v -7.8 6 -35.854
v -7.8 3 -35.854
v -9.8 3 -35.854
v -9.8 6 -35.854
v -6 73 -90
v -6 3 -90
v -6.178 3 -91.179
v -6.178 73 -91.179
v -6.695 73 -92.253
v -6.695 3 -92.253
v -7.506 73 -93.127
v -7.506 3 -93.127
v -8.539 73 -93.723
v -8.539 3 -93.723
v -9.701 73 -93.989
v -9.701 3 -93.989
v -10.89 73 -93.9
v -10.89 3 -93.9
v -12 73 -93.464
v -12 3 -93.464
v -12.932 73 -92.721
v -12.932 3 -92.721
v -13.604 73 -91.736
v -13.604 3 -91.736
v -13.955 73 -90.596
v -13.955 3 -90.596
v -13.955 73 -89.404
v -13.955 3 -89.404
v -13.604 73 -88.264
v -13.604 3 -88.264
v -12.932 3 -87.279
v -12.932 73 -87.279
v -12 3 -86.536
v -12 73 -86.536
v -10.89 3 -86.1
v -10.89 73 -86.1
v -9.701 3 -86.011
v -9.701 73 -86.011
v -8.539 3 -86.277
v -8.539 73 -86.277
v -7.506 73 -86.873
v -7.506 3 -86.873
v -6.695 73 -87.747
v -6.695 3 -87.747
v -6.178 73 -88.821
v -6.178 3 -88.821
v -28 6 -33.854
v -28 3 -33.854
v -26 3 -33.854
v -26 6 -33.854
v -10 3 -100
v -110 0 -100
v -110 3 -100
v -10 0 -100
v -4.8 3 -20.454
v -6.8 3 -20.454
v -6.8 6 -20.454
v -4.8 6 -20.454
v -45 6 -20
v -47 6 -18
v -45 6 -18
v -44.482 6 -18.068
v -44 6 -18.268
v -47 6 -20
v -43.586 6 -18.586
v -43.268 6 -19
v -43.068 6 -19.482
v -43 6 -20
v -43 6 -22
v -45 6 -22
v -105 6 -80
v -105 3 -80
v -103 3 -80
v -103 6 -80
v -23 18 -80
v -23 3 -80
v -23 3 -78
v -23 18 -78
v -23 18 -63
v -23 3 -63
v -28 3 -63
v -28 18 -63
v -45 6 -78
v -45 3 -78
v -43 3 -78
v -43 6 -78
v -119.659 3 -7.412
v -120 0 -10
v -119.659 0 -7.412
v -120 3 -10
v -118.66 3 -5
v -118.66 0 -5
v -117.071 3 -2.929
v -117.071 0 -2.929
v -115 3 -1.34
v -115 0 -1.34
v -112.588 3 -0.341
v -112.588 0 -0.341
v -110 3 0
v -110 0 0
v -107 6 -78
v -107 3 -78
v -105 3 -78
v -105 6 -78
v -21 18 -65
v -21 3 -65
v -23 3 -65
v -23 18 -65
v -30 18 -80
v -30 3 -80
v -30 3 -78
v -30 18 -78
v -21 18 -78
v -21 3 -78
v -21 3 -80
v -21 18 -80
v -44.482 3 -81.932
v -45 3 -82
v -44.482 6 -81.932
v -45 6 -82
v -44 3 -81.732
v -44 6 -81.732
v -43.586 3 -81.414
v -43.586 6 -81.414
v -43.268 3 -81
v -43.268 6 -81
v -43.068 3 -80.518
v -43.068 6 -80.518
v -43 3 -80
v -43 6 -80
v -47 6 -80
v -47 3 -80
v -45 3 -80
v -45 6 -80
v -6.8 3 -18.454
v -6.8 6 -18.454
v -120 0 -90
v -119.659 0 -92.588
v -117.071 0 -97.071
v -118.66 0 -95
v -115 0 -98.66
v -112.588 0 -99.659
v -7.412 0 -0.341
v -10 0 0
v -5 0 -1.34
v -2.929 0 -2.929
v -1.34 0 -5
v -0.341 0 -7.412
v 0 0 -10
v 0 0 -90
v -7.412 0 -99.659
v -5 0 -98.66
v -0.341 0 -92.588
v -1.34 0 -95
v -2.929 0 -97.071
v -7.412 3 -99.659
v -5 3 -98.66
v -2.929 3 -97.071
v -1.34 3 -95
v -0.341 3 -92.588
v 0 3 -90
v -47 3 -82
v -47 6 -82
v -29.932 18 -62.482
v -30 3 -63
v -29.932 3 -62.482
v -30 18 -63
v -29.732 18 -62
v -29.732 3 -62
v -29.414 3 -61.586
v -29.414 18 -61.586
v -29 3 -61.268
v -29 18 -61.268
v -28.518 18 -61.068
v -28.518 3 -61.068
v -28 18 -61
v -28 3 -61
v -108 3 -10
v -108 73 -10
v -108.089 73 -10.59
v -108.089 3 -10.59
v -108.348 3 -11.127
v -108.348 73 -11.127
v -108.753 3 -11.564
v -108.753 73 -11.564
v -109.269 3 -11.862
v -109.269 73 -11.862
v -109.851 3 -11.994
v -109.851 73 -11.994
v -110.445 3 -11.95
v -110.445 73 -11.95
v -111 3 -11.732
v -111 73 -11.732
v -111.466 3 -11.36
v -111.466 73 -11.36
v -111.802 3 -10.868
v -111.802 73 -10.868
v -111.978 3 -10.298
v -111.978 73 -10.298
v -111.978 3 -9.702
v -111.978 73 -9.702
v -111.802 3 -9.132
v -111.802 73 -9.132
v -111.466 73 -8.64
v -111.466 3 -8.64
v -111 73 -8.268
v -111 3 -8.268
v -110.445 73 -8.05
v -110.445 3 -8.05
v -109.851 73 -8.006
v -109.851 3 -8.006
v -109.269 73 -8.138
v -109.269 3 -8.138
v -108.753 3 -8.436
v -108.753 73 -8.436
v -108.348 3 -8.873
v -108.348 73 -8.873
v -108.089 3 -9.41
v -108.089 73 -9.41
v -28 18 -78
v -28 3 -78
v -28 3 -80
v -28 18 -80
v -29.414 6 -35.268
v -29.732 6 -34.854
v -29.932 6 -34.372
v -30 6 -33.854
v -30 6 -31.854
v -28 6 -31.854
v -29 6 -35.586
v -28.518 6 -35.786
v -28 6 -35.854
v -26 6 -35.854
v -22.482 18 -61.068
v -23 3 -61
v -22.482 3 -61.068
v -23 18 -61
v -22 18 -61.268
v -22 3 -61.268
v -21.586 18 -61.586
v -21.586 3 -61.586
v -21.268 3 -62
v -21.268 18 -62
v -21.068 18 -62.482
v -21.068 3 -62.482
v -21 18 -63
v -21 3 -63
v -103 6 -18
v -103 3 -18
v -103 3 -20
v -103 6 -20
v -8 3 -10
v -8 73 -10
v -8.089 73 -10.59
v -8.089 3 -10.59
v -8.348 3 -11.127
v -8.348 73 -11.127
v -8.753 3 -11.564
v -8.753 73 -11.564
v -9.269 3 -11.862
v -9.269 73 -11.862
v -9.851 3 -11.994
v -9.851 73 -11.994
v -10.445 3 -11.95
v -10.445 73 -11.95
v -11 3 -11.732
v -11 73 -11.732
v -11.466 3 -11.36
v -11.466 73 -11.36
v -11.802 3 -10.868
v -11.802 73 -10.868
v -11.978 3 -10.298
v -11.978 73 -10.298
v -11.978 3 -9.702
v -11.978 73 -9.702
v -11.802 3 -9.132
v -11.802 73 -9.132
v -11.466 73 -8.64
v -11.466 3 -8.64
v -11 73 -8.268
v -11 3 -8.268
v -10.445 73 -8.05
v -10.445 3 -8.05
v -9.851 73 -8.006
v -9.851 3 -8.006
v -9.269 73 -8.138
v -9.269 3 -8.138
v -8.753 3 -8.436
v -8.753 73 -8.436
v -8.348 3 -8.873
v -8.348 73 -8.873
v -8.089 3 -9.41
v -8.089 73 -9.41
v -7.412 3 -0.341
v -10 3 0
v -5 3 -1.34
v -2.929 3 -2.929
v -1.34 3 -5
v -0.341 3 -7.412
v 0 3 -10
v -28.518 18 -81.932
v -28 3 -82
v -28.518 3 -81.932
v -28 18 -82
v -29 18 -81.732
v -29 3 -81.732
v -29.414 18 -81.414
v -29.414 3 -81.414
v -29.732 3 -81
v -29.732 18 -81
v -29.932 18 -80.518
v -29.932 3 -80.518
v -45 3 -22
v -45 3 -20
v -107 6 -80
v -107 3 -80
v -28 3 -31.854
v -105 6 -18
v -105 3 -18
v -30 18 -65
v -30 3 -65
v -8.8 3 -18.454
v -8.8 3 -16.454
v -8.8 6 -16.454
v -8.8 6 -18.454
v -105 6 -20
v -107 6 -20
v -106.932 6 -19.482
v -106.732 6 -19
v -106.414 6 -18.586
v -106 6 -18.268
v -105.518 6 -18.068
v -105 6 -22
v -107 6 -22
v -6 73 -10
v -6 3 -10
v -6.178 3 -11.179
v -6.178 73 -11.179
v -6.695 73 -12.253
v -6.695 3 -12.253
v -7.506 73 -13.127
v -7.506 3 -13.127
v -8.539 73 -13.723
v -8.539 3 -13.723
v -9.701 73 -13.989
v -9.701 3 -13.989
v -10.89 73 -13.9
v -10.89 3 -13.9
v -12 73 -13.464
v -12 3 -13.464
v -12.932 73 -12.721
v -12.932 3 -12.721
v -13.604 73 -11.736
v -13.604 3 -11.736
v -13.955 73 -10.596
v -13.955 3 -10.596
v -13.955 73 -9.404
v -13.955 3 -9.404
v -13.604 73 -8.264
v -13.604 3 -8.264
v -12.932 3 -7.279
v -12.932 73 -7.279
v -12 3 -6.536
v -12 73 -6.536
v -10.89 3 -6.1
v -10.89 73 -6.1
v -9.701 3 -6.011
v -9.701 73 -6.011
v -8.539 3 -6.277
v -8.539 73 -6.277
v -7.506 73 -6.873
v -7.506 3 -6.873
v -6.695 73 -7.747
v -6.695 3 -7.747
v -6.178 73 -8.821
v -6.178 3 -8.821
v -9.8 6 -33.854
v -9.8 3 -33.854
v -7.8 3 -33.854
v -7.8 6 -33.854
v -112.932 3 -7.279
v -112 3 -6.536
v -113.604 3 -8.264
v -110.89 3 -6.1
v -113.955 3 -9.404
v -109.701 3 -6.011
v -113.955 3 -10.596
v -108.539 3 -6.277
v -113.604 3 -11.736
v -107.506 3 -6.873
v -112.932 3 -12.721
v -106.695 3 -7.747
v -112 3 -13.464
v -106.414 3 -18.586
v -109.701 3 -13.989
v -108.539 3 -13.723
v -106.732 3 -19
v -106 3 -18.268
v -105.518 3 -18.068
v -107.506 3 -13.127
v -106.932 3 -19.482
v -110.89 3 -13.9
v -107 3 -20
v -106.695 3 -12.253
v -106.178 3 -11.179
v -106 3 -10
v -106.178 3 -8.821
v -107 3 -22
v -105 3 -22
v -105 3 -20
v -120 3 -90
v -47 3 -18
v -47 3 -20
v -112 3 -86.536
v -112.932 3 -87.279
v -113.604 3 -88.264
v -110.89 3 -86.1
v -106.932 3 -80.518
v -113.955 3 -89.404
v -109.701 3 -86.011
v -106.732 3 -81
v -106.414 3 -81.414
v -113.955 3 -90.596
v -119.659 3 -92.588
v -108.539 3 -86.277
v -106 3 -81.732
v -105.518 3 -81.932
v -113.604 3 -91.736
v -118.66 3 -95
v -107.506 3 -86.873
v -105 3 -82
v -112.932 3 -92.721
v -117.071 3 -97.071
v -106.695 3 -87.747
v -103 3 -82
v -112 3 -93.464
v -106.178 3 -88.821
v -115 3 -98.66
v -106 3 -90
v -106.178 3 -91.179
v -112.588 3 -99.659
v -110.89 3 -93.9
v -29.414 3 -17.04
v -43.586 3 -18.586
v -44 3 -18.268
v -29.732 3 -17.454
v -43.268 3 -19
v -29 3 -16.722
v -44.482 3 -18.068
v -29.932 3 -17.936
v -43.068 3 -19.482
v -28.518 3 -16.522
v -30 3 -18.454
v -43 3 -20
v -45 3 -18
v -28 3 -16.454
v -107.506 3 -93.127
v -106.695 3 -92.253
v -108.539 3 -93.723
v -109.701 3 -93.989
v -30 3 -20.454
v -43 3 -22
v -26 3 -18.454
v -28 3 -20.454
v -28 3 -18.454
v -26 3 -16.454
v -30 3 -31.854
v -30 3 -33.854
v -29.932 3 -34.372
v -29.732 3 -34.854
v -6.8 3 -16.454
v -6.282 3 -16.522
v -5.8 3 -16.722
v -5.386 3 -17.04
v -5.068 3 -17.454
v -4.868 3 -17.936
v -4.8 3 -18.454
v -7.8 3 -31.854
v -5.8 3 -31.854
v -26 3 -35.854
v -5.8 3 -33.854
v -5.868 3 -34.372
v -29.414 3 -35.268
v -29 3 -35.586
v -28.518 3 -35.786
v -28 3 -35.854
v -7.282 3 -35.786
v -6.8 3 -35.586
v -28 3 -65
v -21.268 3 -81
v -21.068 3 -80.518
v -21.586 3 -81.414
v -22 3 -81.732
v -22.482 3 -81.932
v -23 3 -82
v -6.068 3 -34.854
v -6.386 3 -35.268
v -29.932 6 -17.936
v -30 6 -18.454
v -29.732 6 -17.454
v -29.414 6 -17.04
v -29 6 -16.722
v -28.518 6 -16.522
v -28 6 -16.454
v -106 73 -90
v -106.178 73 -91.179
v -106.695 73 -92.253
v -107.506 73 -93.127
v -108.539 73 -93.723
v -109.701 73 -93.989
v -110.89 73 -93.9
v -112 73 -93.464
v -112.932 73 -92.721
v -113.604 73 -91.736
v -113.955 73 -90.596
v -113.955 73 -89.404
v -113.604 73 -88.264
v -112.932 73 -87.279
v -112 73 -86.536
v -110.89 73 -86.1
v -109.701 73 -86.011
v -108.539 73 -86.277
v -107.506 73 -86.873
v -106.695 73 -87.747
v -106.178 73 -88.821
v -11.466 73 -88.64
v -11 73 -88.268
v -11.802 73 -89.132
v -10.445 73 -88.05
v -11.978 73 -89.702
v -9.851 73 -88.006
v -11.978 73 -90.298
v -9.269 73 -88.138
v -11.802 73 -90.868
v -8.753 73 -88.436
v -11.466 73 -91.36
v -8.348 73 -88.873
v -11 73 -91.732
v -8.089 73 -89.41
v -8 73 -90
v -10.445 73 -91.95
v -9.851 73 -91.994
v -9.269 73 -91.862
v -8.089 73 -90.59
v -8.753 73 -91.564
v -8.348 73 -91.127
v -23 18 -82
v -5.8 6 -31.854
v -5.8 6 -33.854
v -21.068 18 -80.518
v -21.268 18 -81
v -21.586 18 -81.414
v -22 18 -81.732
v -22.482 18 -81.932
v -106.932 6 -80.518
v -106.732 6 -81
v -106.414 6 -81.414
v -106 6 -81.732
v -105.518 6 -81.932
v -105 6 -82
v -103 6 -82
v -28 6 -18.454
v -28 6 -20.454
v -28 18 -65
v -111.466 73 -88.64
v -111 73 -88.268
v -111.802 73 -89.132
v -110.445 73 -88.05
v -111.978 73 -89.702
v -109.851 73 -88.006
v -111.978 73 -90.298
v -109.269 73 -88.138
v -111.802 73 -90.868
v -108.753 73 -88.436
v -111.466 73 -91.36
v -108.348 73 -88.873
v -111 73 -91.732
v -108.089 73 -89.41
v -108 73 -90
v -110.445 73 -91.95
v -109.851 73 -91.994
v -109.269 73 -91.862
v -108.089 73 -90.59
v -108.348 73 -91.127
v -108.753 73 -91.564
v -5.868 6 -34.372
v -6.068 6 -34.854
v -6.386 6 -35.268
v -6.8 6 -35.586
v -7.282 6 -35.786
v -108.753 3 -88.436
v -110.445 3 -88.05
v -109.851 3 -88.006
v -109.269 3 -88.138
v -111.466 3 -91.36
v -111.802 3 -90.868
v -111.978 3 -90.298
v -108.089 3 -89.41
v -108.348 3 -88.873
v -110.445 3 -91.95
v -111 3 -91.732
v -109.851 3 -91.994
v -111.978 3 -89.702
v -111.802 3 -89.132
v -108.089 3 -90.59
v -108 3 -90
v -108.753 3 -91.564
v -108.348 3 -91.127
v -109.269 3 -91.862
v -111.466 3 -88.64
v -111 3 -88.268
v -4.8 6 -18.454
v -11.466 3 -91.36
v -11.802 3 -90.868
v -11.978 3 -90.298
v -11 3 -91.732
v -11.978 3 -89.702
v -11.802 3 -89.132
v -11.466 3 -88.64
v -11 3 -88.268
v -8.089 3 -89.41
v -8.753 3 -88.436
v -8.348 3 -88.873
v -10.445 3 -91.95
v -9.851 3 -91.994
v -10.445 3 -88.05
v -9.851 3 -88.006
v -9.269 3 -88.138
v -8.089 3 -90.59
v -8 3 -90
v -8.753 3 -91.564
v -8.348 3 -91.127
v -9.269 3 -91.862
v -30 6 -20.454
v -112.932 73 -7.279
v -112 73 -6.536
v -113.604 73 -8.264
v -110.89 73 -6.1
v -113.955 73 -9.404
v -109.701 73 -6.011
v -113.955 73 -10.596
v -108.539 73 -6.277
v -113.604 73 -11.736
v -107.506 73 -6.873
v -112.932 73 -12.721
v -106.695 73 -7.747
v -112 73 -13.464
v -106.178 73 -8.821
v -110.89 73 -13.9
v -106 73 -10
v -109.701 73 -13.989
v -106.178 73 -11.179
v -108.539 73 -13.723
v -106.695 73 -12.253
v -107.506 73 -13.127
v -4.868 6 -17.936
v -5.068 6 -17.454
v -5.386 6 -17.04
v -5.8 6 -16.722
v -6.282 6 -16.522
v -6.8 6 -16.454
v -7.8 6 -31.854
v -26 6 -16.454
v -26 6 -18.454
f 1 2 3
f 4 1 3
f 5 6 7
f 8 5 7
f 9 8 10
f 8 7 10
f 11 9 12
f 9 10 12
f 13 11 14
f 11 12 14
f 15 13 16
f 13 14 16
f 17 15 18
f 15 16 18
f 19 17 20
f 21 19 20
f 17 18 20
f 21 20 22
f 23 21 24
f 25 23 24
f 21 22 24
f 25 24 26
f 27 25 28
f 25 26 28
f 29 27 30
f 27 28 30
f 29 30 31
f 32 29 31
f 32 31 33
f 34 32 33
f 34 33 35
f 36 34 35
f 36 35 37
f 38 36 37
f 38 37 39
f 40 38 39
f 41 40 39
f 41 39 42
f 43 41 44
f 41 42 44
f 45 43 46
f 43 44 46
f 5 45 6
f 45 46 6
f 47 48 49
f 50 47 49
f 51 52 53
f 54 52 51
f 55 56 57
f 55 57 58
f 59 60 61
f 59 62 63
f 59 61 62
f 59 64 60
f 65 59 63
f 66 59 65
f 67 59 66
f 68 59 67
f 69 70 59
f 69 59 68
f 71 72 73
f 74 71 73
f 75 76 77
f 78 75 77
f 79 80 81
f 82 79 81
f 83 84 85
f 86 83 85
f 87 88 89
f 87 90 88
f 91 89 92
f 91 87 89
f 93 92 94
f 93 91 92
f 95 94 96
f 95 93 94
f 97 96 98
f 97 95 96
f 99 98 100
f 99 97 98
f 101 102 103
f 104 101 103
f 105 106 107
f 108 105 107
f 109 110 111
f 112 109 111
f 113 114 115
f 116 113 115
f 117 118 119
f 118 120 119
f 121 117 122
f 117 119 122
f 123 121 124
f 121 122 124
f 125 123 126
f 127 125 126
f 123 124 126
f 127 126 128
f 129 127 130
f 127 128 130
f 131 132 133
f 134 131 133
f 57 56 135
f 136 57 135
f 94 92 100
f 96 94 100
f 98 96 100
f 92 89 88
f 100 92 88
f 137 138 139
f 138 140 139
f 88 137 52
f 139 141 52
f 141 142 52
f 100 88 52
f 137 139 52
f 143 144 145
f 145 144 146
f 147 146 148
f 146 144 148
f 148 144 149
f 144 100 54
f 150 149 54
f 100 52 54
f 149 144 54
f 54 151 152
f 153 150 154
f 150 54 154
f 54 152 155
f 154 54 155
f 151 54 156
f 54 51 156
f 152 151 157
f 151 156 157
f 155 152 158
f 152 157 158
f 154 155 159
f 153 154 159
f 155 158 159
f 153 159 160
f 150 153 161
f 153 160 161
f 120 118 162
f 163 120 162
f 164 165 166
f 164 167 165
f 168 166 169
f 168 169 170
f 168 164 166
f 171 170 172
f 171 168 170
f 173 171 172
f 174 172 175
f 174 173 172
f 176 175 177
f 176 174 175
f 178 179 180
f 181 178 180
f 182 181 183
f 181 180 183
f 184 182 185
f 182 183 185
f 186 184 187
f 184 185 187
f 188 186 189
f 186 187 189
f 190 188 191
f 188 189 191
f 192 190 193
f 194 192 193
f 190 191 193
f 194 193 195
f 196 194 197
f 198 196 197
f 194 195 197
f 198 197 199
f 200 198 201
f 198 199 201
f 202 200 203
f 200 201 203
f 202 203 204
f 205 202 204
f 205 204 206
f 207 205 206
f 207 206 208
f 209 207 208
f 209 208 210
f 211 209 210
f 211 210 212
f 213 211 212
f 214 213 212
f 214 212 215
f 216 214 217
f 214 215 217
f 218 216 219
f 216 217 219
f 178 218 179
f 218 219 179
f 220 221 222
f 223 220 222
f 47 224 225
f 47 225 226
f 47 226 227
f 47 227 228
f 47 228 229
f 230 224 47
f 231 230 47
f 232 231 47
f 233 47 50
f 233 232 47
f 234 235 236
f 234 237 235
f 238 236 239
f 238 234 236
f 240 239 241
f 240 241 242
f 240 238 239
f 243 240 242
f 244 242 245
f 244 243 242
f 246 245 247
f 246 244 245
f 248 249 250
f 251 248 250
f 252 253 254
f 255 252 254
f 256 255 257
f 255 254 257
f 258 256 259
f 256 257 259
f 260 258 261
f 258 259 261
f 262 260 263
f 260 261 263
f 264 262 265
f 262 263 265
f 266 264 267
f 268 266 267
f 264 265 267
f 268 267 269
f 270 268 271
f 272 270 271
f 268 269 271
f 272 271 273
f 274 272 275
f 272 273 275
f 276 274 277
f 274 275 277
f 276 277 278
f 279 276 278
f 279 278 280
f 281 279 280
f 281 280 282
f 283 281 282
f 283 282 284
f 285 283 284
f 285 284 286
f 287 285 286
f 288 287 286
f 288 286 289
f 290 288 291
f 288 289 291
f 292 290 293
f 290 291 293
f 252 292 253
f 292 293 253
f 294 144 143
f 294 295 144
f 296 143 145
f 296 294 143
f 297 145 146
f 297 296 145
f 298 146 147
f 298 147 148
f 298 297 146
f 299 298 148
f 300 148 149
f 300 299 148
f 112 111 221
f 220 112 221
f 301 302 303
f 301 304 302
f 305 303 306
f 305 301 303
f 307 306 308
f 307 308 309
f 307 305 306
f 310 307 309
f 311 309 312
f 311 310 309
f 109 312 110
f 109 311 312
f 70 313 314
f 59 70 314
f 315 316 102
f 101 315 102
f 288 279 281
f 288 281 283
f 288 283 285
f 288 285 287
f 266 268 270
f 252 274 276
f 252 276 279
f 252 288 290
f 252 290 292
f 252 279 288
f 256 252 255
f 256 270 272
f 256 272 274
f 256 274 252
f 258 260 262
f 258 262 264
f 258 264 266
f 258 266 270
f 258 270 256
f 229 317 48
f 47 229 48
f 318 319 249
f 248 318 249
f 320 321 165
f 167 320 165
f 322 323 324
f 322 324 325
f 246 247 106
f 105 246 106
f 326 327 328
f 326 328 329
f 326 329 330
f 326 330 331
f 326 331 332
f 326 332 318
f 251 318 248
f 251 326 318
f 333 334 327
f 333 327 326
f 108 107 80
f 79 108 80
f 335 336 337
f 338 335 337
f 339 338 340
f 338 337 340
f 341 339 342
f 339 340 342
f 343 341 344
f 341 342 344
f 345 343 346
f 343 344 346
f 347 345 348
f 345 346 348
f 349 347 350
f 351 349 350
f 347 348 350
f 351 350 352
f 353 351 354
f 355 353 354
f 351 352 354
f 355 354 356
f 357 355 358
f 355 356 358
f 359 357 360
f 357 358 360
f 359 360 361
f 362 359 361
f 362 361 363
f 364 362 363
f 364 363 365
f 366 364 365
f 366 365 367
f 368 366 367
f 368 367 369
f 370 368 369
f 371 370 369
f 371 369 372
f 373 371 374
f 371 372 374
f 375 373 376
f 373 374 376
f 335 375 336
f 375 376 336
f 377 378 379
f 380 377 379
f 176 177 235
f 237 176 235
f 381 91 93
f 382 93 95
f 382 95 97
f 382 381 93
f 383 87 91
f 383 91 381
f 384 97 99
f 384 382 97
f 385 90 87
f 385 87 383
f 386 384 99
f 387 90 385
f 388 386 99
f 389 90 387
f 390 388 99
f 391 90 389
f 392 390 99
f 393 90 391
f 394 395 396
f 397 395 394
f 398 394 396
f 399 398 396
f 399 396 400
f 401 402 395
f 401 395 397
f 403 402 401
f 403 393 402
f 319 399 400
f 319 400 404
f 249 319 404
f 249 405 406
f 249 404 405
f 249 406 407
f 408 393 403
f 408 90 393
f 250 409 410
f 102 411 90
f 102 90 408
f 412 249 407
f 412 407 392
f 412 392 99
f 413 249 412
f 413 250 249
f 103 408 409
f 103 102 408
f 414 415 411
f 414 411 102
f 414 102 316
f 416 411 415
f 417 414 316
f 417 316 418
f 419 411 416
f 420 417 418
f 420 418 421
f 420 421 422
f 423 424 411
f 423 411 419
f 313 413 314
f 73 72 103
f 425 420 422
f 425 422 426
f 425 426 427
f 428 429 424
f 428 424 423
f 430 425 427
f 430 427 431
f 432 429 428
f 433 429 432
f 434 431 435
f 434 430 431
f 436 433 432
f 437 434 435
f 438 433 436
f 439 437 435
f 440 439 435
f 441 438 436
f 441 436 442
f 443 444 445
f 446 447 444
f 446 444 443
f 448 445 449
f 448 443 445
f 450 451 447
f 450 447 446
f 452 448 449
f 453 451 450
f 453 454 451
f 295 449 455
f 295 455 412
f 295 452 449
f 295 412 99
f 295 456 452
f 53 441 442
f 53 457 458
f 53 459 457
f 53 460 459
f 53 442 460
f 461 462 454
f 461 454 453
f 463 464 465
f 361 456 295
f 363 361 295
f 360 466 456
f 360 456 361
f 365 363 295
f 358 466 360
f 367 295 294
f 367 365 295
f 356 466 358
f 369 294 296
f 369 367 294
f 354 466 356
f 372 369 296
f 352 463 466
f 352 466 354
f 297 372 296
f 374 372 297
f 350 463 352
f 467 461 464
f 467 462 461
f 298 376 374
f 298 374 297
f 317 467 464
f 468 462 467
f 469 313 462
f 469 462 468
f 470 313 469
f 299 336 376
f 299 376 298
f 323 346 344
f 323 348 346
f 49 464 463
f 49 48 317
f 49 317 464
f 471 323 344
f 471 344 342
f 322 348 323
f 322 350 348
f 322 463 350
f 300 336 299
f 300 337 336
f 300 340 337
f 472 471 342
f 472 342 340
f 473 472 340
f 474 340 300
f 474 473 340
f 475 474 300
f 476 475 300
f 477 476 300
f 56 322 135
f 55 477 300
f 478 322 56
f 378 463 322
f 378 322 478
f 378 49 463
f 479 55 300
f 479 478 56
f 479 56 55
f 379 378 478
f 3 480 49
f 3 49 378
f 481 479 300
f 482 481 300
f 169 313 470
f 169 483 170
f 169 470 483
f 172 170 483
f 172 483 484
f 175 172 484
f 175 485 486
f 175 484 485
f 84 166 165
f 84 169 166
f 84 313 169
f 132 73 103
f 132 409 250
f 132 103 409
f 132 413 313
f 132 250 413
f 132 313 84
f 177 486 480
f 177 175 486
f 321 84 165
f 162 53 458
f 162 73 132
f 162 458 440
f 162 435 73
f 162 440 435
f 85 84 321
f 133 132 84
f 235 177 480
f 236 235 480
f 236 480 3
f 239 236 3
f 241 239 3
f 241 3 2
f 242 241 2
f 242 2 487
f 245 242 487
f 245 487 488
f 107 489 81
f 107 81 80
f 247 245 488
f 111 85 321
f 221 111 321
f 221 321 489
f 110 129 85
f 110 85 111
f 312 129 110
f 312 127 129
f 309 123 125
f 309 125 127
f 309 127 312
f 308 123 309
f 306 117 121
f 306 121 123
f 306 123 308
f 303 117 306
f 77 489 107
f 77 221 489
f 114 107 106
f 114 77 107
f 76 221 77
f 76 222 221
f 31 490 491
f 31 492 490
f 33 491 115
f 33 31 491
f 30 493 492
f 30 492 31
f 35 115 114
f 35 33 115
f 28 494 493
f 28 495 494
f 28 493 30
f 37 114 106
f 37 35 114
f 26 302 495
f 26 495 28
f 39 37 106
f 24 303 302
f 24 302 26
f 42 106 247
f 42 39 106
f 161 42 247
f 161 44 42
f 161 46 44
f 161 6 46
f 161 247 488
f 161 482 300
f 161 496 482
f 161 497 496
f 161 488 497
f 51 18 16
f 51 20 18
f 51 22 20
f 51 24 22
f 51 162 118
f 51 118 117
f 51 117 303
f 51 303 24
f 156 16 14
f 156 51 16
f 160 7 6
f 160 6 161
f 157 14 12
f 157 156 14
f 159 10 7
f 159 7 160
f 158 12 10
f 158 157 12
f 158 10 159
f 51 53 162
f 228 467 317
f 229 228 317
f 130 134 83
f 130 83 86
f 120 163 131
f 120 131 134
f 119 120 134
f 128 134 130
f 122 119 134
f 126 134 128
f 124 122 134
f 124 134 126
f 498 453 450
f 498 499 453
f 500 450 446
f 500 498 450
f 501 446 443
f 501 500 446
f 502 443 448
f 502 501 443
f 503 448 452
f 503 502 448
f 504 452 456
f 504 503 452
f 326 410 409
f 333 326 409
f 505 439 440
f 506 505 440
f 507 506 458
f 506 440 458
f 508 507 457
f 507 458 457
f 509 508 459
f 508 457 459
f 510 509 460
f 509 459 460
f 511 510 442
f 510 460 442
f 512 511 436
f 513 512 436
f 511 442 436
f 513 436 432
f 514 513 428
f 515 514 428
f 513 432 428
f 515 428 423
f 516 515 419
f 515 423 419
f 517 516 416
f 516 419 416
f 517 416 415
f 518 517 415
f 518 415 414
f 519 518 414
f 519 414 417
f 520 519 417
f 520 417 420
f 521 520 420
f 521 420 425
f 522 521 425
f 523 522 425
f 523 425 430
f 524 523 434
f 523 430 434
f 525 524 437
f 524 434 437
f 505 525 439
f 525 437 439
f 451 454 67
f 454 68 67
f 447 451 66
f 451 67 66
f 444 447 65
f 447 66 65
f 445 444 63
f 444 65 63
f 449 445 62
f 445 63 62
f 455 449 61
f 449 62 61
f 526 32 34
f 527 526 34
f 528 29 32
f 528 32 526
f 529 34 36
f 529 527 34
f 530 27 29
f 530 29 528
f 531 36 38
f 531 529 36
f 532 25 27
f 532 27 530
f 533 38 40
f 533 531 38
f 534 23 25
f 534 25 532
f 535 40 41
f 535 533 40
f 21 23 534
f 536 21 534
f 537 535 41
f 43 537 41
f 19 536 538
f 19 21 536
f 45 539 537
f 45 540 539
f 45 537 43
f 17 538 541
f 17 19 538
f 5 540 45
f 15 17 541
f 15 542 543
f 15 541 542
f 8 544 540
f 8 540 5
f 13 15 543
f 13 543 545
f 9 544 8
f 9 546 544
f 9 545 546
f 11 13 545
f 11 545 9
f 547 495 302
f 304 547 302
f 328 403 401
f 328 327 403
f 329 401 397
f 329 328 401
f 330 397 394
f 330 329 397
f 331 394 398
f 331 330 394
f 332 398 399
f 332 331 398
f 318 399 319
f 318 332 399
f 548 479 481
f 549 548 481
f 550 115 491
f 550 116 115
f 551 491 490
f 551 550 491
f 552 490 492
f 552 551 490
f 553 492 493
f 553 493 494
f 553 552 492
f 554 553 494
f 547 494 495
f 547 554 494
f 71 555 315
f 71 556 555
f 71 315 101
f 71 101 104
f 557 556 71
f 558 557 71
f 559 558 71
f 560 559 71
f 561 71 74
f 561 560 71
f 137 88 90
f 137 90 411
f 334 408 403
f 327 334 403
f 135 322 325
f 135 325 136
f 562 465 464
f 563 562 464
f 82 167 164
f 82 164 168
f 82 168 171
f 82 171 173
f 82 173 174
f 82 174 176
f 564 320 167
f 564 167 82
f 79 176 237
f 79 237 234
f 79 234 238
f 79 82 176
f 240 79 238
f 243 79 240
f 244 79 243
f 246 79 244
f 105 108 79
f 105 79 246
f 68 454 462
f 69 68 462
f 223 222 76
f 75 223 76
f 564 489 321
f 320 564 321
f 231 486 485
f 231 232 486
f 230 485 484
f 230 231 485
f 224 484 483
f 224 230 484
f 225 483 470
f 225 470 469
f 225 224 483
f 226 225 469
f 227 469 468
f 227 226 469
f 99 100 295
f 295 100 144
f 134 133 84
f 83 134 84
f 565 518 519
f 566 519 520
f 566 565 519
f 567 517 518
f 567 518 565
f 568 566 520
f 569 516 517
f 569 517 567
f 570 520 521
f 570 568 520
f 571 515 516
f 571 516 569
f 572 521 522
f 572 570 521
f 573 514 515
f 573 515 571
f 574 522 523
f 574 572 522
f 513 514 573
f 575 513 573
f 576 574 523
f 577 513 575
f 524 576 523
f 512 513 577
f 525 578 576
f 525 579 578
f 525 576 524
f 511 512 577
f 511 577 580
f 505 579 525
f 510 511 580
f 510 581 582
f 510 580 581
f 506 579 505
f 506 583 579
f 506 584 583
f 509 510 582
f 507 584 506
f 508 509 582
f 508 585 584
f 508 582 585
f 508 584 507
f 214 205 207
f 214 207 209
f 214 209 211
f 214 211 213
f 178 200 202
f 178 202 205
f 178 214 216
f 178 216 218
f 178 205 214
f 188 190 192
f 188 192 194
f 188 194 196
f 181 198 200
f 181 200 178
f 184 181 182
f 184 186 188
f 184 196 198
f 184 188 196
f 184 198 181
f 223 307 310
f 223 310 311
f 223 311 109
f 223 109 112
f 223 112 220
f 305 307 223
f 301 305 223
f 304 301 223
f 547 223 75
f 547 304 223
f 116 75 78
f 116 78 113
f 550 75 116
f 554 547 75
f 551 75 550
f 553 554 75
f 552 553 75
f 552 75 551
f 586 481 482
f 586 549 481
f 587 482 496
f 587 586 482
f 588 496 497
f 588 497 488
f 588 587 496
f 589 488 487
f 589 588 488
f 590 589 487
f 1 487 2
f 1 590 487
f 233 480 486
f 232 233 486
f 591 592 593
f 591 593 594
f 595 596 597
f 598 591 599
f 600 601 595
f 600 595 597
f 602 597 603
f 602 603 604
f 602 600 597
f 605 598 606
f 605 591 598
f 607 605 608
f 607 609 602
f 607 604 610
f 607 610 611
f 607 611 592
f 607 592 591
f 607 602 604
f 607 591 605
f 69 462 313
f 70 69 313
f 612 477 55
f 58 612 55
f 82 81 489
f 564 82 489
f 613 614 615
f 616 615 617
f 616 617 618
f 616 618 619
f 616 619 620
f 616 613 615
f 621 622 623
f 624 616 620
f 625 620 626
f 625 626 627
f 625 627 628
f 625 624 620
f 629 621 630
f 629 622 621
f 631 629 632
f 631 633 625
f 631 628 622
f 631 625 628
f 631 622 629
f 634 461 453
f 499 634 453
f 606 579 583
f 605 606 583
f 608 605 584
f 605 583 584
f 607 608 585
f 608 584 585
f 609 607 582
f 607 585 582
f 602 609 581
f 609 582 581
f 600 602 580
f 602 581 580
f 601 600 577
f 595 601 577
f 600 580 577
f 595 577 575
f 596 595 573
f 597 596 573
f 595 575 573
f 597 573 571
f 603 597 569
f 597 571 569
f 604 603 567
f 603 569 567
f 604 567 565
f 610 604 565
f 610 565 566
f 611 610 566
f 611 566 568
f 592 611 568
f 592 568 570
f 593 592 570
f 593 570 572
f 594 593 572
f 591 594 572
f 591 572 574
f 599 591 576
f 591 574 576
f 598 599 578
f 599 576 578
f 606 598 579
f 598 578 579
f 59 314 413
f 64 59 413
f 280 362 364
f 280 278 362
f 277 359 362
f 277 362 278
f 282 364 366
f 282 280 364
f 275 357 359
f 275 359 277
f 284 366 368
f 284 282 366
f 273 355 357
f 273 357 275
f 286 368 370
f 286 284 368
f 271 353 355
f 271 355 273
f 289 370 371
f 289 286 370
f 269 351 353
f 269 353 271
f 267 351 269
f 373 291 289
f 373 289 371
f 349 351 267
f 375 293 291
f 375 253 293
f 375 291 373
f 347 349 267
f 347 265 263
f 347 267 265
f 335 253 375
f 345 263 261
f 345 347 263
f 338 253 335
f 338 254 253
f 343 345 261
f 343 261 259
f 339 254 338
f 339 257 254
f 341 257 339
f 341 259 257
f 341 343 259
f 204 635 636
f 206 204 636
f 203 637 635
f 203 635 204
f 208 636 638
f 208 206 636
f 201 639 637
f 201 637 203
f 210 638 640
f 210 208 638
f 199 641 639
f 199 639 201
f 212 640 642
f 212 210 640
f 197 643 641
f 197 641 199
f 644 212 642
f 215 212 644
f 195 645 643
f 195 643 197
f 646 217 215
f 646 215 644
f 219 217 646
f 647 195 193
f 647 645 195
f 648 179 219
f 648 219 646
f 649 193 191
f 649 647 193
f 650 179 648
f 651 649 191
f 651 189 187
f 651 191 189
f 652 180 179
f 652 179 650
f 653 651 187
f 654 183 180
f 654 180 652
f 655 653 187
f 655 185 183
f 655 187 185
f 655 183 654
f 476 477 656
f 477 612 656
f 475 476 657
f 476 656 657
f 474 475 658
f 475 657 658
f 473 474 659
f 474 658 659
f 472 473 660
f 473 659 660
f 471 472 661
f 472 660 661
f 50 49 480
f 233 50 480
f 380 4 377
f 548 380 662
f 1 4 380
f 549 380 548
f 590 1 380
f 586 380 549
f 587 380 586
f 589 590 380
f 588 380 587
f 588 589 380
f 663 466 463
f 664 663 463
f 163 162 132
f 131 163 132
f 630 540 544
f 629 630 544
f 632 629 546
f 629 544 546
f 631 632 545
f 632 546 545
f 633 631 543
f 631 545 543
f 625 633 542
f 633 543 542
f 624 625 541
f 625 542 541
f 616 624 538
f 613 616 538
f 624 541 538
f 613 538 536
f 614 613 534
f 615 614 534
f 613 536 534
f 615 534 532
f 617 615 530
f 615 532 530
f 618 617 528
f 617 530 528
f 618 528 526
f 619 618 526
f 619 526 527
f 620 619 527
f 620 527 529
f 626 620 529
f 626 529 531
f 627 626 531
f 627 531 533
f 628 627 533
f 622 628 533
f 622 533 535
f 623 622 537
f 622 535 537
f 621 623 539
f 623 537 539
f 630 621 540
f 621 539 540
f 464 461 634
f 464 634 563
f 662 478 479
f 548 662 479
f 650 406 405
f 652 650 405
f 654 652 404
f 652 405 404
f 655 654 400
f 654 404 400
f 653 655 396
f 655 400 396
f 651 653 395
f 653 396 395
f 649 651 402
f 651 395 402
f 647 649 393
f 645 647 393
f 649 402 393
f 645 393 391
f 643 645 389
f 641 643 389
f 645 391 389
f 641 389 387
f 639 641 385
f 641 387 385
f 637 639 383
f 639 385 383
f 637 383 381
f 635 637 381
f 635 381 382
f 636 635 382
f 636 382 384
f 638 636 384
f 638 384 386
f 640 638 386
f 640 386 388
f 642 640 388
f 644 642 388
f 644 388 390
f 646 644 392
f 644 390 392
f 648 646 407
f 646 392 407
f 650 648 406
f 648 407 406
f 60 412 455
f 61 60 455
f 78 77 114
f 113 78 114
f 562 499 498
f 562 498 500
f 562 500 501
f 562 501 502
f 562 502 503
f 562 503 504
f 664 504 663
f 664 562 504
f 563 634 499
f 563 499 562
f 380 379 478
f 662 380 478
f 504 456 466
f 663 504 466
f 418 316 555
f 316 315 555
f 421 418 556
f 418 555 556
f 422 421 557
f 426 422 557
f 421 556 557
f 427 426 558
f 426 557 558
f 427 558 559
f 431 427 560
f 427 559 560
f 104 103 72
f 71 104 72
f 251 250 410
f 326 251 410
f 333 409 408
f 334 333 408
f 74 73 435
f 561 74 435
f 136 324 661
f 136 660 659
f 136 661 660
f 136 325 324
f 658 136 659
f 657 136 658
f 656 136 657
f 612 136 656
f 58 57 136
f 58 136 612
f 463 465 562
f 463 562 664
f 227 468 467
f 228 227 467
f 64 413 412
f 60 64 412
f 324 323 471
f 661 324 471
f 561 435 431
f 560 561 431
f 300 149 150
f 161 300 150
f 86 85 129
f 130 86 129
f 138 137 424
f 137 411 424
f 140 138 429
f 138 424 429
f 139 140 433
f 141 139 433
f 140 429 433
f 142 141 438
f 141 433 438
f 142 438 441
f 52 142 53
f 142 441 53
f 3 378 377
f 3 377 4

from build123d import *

# Parameters (mm, degrees)
ESQUISSE1_W             = 120
ESQUISSE1_H             = 100
BOSS_EXTRU_1_DEPTH      = 3
ESQUISSE2_W             = 2
ESQUISSE2_H             = 2
BOSS_EXTRU_2_DEPTH      = 3
ESQUISSE4_R             = 4
BOSS_EXTRU_4_DEPTH      = 70
ESQUISSE5_R             = 2
ENL_V_MAT_EXTRU_1_DEPTH = 70
CONG_1_R                = 10
BOSS_EXTRU_6_DEPTH      = 15
CONG_2_R                = 2


with BuildPart() as part:
    # Esquisse1 → Boss.-Extru.1 (new body)
    with BuildSketch(Plane(origin=(0, 0, 0), x_dir=(1, 0, 0), z_dir=(0, 1, 0))):
        with Locations((-60, 50)):
            Rectangle(ESQUISSE1_W, ESQUISSE1_H)
    extrude(amount=BOSS_EXTRU_1_DEPTH)

    # Esquisse2 → Boss.-Extru.2 (add)
    with BuildSketch(Plane(origin=(0, 3, 0), x_dir=(1, 0, 0), z_dir=(0, 1, 0))):
        Polygon((-105, 78), (-105, 80), (-103, 80), (-103, 82), (-107, 82), (-107, 78), align=None)
        Polygon((-105, 20), (-105, 22), (-107, 22), (-107, 18), (-103, 18), (-103, 20), align=None)
        Polygon((-43, 22), (-45, 22), (-45, 20), (-47, 20), (-47, 18), (-43, 18), align=None)
        Polygon((-47, 82), (-47, 80), (-45, 80), (-45, 78), (-43, 78), (-43, 82), align=None)
        with Locations((-6.8, 32.854127418)):
            Rectangle(ESQUISSE2_W, ESQUISSE2_H)
        with Locations((-6.8, 34.854127418)):
            Rectangle(ESQUISSE2_W, ESQUISSE2_H)
        with Locations((-8.8, 34.854127418)):
            Rectangle(ESQUISSE2_W, ESQUISSE2_H)
        with Locations((-27, 34.854127418)):
            Rectangle(ESQUISSE2_W, ESQUISSE2_H)
        with Locations((-29, 34.854127418)):
            Rectangle(ESQUISSE2_W, ESQUISSE2_H)
        with Locations((-29, 32.854127418)):
            Rectangle(ESQUISSE2_W, ESQUISSE2_H)
        with Locations((-29, 19.454127418)):
            Rectangle(ESQUISSE2_W, ESQUISSE2_H)
        with Locations((-29, 17.454127418)):
            Rectangle(ESQUISSE2_W, ESQUISSE2_H)
        with Locations((-27, 17.454127418)):
            Rectangle(ESQUISSE2_W, ESQUISSE2_H)
        with Locations((-5.8, 19.454127418)):
            Rectangle(ESQUISSE2_W, ESQUISSE2_H)
        with Locations((-5.8, 17.454127418)):
            Rectangle(ESQUISSE2_W, ESQUISSE2_H)
        with Locations((-7.8, 17.454127418)):
            Rectangle(ESQUISSE2_W, ESQUISSE2_H)
    extrude(amount=BOSS_EXTRU_2_DEPTH)

    # Esquisse4 → Boss.-Extru.4 (add)
    with BuildSketch(Plane(origin=(0, 3, 0), x_dir=(1, 0, 0), z_dir=(0, 1, 0))):
        with Locations((-10, 90)):
            Circle(ESQUISSE4_R)
        with Locations((-110, 90)):
            Circle(ESQUISSE4_R)
        with Locations((-110, 10)):
            Circle(ESQUISSE4_R)
        with Locations((-10, 10)):
            Circle(ESQUISSE4_R)
    extrude(amount=BOSS_EXTRU_4_DEPTH)

    # Esquisse5 → Enlèv. mat.-Extru.1 (cut)
    with BuildSketch(Plane(origin=(0, 73, 0), x_dir=(1, 0, 0), z_dir=(0, 1, 0))):
        with Locations((-110, 90)):
            Circle(ESQUISSE5_R)
        with Locations((-110, 10)):
            Circle(ESQUISSE5_R)
        with Locations((-10, 90)):
            Circle(ESQUISSE5_R)
        with Locations((-10, 10)):
            Circle(ESQUISSE5_R)
    extrude(amount=-ENL_V_MAT_EXTRU_1_DEPTH, mode=Mode.SUBTRACT)

    # Congé1
    cong_1_edges = [part.edges().sort_by_distance(p)[0] for p in [
        (0, 1.5, 0),
        (-120, 1.5, 0),
        (-120, 1.5, -100),
        (0, 1.5, -100),
    ]]
    fillet(cong_1_edges, radius=CONG_1_R)

    # Esquisse3 → Boss.-Extru.6 (add)
    with BuildSketch(Plane(origin=(0, 3, 0), x_dir=(1, 0, 0), z_dir=(0, 1, 0))):
        Polygon((-30, 78), (-28, 78), (-28, 80), (-23, 80), (-23, 78), (-21, 78), (-21, 82), (-28.2, 82), (-29.2, 82), (-30, 82), align=None)
        Polygon((-23, 63), (-28, 63), (-28, 65), (-30, 65), (-30, 61), (-26, 61), (-21, 61), (-21, 65), (-23, 65), align=None)
    extrude(amount=BOSS_EXTRU_6_DEPTH)

    # Congé2
    cong_2_edges = [part.edges().sort_by_distance(p)[0] for p in [
        (-30, 4.5, -16.454127418),
        (-4.8, 4.5, -16.454127418),
        (-107, 4.5, -82),
        (-21, 10.5, -82),
        (-30, 10.5, -82),
        (-30, 10.5, -61),
        (-21, 10.5, -61),
        (-107, 4.5, -18),
        (-43, 4.5, -18),
        (-43, 4.5, -82),
        (-5.8, 4.5, -35.854127418),
        (-30, 4.5, -35.854127418),
    ]]
    fillet(cong_2_edges, radius=CONG_2_R)


solid = part.part
